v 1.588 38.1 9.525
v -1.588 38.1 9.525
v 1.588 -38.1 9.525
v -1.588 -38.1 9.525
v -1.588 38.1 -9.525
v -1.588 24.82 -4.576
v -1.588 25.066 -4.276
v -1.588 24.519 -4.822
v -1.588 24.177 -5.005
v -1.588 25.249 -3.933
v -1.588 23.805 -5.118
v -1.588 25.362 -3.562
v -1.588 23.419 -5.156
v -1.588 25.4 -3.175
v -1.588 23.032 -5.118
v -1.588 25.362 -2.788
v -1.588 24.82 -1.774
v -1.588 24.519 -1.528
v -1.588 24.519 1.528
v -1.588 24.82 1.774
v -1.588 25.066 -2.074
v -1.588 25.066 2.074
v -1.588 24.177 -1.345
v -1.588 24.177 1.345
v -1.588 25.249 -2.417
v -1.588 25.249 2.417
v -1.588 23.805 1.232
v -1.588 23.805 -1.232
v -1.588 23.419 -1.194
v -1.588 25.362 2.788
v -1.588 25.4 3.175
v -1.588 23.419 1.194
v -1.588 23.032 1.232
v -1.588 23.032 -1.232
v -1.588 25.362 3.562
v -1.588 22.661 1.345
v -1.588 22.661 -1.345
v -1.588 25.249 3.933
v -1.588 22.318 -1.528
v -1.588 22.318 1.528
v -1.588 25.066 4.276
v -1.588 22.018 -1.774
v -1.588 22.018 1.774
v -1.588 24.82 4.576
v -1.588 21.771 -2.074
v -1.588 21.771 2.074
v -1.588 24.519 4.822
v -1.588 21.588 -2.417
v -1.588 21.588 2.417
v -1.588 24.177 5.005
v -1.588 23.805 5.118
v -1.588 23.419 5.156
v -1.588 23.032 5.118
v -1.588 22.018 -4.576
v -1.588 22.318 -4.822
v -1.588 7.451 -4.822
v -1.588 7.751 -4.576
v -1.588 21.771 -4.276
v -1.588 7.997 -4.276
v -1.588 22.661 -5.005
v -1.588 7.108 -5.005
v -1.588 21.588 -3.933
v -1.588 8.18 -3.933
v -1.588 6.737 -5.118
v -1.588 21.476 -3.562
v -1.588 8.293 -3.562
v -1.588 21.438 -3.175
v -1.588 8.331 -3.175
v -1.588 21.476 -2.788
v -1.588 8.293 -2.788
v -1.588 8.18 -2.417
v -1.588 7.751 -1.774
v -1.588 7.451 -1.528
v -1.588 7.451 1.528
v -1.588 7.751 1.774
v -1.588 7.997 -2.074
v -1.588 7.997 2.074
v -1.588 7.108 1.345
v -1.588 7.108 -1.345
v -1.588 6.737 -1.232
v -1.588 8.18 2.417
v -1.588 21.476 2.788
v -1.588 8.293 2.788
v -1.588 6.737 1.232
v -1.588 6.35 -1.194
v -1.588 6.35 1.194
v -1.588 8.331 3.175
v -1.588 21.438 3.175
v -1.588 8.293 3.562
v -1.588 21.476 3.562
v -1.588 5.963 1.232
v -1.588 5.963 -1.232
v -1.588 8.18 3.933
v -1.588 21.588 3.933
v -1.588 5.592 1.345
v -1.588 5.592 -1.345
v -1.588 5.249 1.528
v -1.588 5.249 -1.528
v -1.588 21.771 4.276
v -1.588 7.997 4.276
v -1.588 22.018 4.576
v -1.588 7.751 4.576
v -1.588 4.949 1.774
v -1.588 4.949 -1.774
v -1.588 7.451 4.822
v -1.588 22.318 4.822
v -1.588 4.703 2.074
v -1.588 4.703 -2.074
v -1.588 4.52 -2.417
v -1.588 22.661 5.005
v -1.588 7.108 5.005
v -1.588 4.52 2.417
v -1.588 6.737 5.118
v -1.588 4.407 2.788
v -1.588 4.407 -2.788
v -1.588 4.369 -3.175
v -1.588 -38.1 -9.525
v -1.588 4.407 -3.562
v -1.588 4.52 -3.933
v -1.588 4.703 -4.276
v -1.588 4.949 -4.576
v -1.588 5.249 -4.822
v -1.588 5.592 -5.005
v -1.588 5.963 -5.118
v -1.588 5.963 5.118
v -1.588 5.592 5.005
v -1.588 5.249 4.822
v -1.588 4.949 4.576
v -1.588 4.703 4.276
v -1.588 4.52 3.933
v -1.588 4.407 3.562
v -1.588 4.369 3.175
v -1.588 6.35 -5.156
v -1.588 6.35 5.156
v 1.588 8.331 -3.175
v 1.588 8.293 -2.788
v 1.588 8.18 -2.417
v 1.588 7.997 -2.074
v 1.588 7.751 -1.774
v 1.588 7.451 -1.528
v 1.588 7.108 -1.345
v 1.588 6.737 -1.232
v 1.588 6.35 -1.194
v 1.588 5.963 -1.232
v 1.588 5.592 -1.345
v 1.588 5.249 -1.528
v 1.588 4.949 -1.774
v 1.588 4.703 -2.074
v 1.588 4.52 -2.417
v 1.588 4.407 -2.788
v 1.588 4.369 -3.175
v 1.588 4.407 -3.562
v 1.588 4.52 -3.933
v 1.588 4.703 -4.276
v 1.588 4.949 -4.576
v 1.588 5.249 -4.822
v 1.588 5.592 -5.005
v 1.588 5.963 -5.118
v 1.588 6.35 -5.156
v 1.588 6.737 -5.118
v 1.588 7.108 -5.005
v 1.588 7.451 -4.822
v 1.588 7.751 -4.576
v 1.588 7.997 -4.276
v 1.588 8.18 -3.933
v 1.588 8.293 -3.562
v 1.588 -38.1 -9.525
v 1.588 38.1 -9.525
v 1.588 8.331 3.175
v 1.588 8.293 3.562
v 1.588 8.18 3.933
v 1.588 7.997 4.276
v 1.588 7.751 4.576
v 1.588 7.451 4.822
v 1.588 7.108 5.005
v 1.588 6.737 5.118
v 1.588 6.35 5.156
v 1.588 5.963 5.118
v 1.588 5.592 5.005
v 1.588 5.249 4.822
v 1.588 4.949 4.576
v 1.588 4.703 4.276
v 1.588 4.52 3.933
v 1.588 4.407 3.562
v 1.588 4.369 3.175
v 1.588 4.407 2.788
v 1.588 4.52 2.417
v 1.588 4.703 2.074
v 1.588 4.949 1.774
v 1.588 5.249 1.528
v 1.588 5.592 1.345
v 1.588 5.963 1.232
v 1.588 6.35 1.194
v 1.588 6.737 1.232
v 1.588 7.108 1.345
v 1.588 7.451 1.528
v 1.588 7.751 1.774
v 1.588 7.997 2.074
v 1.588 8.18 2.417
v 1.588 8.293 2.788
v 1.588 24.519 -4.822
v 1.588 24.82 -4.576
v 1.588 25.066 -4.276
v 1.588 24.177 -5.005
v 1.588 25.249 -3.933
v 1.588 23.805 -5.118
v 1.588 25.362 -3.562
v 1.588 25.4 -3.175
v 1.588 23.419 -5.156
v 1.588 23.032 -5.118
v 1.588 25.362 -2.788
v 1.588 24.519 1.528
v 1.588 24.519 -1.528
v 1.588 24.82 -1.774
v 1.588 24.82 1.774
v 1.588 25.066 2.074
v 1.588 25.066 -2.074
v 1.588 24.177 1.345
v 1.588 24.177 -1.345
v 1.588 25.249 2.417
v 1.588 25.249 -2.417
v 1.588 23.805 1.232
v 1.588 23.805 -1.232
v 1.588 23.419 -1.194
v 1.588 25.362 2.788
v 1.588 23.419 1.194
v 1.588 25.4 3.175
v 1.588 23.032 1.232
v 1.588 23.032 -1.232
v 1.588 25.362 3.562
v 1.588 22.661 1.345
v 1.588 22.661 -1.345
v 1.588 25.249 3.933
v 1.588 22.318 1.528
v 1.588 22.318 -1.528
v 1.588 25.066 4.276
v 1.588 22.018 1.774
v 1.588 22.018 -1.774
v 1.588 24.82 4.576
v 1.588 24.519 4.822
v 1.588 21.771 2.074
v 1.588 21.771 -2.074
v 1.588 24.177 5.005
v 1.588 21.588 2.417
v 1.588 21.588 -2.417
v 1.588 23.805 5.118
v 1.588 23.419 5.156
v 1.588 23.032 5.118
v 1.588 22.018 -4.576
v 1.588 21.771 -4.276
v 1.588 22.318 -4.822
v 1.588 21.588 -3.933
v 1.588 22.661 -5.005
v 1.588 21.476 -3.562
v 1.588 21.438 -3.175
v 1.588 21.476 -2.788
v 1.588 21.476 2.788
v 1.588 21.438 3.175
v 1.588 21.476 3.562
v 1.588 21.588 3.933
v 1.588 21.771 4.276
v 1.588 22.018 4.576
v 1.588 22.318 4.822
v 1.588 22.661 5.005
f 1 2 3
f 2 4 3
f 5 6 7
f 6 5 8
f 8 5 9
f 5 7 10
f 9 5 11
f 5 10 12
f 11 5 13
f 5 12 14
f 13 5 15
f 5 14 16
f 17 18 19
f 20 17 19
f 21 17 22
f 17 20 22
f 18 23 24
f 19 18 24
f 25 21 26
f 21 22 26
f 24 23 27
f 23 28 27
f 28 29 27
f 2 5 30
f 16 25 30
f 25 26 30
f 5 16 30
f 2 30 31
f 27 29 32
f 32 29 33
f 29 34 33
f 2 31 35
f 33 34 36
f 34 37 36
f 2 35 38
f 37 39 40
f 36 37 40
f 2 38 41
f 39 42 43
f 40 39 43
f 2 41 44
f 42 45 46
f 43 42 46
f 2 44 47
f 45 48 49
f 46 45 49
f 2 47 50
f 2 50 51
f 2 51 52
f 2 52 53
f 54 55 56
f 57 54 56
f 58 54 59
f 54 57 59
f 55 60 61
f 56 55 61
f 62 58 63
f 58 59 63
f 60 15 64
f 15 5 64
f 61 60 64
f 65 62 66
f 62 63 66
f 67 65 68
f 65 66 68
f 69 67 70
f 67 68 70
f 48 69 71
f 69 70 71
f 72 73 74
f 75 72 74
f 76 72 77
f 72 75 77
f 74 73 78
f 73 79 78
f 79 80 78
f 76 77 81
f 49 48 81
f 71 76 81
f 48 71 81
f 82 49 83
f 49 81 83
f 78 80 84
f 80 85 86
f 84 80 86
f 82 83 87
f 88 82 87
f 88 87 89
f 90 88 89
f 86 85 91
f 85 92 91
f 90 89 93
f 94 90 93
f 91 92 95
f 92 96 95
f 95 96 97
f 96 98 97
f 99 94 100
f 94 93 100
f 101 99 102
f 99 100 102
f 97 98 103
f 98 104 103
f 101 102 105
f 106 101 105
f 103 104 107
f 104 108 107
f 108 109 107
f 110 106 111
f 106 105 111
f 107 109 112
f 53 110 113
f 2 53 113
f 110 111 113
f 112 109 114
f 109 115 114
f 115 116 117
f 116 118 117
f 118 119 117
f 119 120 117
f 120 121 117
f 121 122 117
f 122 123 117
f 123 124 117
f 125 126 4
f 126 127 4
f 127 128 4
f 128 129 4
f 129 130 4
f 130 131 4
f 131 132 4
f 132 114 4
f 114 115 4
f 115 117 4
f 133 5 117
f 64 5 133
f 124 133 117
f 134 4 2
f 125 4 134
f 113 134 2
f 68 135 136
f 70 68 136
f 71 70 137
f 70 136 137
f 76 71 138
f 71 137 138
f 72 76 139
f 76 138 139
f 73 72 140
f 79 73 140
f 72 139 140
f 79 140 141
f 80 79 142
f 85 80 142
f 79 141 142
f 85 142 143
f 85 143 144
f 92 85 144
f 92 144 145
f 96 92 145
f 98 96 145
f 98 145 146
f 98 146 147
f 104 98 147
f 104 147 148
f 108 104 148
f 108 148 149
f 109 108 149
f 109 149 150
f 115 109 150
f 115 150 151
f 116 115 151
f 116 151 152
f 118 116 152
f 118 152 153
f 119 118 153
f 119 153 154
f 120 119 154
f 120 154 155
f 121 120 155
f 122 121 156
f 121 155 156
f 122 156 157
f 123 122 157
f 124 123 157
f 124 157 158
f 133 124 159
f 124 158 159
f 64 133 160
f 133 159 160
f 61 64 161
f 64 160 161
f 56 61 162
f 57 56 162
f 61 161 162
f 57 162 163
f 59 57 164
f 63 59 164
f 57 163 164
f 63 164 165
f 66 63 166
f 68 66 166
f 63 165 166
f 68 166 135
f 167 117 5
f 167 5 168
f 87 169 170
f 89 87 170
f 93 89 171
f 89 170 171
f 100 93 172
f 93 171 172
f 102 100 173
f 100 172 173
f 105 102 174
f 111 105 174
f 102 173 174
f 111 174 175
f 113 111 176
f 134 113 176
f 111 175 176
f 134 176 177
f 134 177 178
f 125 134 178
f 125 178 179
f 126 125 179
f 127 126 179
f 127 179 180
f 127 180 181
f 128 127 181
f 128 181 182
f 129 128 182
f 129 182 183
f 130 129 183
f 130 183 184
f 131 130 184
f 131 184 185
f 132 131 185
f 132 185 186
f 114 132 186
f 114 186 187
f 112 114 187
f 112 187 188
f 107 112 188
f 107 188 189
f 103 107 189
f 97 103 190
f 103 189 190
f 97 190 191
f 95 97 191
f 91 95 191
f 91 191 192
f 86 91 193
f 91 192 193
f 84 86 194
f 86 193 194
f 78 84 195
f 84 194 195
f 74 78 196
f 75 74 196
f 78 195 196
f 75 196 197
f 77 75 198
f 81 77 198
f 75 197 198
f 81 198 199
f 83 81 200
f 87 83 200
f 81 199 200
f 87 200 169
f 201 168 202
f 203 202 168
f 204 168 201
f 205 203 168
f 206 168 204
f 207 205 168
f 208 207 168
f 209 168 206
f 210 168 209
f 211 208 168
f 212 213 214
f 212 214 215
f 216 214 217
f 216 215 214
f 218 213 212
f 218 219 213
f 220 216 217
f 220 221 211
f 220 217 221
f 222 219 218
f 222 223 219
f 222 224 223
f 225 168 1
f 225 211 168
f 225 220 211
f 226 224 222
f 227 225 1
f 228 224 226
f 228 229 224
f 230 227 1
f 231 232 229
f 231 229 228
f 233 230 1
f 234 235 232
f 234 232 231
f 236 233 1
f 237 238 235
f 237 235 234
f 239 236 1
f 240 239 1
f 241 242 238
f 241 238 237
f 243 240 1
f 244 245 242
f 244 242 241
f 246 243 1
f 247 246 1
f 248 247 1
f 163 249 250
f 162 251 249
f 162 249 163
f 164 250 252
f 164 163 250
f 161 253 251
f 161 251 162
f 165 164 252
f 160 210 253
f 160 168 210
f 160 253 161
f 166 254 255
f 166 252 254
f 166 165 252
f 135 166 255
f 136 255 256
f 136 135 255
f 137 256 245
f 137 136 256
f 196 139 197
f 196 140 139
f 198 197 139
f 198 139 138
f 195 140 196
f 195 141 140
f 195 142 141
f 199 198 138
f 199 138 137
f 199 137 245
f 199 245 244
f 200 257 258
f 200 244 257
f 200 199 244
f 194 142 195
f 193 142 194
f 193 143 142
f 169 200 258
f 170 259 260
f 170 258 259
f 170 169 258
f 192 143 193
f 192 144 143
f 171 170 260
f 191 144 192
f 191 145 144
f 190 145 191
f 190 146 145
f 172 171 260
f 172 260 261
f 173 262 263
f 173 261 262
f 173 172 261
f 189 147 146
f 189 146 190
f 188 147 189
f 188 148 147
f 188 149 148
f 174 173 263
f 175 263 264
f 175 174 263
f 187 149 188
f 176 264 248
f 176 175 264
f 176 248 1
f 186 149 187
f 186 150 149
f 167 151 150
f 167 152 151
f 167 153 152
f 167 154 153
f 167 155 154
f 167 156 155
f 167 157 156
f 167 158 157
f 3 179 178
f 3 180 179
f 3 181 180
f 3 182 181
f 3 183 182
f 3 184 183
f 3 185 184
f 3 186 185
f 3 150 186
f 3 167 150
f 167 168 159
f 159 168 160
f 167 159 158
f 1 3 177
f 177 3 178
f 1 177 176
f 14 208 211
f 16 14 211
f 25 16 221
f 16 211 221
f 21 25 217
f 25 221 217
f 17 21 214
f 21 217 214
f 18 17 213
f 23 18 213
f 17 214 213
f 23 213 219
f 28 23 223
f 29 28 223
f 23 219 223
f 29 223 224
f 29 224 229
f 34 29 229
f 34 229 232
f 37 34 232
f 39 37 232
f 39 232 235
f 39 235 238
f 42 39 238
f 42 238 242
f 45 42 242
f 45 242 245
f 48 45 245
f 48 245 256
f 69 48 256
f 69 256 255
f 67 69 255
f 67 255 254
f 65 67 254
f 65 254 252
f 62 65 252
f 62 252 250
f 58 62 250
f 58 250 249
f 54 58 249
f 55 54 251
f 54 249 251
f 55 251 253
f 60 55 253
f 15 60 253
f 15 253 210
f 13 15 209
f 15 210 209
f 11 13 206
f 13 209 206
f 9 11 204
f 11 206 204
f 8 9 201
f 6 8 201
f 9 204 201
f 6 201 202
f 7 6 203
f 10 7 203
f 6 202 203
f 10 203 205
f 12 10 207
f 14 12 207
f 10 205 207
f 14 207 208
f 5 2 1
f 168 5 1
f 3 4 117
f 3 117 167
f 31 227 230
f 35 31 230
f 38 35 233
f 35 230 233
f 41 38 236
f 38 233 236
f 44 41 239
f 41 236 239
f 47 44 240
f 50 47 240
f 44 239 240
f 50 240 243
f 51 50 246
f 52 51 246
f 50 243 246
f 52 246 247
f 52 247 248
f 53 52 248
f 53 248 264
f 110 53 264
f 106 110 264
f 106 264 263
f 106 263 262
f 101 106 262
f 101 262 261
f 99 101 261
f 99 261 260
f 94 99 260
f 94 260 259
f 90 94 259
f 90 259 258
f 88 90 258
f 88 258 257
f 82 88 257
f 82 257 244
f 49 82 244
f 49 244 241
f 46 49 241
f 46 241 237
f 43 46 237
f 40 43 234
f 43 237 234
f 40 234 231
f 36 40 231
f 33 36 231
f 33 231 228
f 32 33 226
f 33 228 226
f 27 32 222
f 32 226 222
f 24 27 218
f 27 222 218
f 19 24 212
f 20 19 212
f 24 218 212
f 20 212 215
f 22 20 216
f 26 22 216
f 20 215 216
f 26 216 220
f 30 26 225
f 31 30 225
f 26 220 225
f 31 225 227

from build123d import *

# Parameters (mm, degrees)
F0_W     = 3.175
F0_H     = 19.05
F1_DEPTH = 38.1
F2_R     = 1.9812
F3_DEPTH = 3.176
F4_R     = 1.9812
F5_DEPTH = 3.176


with BuildPart() as f1:
    # F0 (on Front) → F1 (new body, symmetric)
    with BuildSketch(Plane.XZ):
        Rectangle(F0_W, F0_H)
    extrude(amount=F1_DEPTH, both=True)

    # F2 (on face) → F3 (cut, through all)
    with BuildSketch(Plane.YZ.offset(1.5875)):
        with Locations((23.4188, 3.175)):
            Circle(F2_R)
        with Locations((23.4188, -3.175)):
            Circle(F2_R)
    extrude(amount=-F3_DEPTH, mode=Mode.SUBTRACT)

    # F4 (on face) → F5 (cut, through all)
    with BuildSketch(Plane.YZ.offset(1.5875)):
        with Locations((6.35, 3.175)):
            Circle(F4_R)
        with Locations((6.35, -3.175)):
            Circle(F4_R)
    extrude(amount=-F5_DEPTH, mode=Mode.SUBTRACT)


solid = f1.part
